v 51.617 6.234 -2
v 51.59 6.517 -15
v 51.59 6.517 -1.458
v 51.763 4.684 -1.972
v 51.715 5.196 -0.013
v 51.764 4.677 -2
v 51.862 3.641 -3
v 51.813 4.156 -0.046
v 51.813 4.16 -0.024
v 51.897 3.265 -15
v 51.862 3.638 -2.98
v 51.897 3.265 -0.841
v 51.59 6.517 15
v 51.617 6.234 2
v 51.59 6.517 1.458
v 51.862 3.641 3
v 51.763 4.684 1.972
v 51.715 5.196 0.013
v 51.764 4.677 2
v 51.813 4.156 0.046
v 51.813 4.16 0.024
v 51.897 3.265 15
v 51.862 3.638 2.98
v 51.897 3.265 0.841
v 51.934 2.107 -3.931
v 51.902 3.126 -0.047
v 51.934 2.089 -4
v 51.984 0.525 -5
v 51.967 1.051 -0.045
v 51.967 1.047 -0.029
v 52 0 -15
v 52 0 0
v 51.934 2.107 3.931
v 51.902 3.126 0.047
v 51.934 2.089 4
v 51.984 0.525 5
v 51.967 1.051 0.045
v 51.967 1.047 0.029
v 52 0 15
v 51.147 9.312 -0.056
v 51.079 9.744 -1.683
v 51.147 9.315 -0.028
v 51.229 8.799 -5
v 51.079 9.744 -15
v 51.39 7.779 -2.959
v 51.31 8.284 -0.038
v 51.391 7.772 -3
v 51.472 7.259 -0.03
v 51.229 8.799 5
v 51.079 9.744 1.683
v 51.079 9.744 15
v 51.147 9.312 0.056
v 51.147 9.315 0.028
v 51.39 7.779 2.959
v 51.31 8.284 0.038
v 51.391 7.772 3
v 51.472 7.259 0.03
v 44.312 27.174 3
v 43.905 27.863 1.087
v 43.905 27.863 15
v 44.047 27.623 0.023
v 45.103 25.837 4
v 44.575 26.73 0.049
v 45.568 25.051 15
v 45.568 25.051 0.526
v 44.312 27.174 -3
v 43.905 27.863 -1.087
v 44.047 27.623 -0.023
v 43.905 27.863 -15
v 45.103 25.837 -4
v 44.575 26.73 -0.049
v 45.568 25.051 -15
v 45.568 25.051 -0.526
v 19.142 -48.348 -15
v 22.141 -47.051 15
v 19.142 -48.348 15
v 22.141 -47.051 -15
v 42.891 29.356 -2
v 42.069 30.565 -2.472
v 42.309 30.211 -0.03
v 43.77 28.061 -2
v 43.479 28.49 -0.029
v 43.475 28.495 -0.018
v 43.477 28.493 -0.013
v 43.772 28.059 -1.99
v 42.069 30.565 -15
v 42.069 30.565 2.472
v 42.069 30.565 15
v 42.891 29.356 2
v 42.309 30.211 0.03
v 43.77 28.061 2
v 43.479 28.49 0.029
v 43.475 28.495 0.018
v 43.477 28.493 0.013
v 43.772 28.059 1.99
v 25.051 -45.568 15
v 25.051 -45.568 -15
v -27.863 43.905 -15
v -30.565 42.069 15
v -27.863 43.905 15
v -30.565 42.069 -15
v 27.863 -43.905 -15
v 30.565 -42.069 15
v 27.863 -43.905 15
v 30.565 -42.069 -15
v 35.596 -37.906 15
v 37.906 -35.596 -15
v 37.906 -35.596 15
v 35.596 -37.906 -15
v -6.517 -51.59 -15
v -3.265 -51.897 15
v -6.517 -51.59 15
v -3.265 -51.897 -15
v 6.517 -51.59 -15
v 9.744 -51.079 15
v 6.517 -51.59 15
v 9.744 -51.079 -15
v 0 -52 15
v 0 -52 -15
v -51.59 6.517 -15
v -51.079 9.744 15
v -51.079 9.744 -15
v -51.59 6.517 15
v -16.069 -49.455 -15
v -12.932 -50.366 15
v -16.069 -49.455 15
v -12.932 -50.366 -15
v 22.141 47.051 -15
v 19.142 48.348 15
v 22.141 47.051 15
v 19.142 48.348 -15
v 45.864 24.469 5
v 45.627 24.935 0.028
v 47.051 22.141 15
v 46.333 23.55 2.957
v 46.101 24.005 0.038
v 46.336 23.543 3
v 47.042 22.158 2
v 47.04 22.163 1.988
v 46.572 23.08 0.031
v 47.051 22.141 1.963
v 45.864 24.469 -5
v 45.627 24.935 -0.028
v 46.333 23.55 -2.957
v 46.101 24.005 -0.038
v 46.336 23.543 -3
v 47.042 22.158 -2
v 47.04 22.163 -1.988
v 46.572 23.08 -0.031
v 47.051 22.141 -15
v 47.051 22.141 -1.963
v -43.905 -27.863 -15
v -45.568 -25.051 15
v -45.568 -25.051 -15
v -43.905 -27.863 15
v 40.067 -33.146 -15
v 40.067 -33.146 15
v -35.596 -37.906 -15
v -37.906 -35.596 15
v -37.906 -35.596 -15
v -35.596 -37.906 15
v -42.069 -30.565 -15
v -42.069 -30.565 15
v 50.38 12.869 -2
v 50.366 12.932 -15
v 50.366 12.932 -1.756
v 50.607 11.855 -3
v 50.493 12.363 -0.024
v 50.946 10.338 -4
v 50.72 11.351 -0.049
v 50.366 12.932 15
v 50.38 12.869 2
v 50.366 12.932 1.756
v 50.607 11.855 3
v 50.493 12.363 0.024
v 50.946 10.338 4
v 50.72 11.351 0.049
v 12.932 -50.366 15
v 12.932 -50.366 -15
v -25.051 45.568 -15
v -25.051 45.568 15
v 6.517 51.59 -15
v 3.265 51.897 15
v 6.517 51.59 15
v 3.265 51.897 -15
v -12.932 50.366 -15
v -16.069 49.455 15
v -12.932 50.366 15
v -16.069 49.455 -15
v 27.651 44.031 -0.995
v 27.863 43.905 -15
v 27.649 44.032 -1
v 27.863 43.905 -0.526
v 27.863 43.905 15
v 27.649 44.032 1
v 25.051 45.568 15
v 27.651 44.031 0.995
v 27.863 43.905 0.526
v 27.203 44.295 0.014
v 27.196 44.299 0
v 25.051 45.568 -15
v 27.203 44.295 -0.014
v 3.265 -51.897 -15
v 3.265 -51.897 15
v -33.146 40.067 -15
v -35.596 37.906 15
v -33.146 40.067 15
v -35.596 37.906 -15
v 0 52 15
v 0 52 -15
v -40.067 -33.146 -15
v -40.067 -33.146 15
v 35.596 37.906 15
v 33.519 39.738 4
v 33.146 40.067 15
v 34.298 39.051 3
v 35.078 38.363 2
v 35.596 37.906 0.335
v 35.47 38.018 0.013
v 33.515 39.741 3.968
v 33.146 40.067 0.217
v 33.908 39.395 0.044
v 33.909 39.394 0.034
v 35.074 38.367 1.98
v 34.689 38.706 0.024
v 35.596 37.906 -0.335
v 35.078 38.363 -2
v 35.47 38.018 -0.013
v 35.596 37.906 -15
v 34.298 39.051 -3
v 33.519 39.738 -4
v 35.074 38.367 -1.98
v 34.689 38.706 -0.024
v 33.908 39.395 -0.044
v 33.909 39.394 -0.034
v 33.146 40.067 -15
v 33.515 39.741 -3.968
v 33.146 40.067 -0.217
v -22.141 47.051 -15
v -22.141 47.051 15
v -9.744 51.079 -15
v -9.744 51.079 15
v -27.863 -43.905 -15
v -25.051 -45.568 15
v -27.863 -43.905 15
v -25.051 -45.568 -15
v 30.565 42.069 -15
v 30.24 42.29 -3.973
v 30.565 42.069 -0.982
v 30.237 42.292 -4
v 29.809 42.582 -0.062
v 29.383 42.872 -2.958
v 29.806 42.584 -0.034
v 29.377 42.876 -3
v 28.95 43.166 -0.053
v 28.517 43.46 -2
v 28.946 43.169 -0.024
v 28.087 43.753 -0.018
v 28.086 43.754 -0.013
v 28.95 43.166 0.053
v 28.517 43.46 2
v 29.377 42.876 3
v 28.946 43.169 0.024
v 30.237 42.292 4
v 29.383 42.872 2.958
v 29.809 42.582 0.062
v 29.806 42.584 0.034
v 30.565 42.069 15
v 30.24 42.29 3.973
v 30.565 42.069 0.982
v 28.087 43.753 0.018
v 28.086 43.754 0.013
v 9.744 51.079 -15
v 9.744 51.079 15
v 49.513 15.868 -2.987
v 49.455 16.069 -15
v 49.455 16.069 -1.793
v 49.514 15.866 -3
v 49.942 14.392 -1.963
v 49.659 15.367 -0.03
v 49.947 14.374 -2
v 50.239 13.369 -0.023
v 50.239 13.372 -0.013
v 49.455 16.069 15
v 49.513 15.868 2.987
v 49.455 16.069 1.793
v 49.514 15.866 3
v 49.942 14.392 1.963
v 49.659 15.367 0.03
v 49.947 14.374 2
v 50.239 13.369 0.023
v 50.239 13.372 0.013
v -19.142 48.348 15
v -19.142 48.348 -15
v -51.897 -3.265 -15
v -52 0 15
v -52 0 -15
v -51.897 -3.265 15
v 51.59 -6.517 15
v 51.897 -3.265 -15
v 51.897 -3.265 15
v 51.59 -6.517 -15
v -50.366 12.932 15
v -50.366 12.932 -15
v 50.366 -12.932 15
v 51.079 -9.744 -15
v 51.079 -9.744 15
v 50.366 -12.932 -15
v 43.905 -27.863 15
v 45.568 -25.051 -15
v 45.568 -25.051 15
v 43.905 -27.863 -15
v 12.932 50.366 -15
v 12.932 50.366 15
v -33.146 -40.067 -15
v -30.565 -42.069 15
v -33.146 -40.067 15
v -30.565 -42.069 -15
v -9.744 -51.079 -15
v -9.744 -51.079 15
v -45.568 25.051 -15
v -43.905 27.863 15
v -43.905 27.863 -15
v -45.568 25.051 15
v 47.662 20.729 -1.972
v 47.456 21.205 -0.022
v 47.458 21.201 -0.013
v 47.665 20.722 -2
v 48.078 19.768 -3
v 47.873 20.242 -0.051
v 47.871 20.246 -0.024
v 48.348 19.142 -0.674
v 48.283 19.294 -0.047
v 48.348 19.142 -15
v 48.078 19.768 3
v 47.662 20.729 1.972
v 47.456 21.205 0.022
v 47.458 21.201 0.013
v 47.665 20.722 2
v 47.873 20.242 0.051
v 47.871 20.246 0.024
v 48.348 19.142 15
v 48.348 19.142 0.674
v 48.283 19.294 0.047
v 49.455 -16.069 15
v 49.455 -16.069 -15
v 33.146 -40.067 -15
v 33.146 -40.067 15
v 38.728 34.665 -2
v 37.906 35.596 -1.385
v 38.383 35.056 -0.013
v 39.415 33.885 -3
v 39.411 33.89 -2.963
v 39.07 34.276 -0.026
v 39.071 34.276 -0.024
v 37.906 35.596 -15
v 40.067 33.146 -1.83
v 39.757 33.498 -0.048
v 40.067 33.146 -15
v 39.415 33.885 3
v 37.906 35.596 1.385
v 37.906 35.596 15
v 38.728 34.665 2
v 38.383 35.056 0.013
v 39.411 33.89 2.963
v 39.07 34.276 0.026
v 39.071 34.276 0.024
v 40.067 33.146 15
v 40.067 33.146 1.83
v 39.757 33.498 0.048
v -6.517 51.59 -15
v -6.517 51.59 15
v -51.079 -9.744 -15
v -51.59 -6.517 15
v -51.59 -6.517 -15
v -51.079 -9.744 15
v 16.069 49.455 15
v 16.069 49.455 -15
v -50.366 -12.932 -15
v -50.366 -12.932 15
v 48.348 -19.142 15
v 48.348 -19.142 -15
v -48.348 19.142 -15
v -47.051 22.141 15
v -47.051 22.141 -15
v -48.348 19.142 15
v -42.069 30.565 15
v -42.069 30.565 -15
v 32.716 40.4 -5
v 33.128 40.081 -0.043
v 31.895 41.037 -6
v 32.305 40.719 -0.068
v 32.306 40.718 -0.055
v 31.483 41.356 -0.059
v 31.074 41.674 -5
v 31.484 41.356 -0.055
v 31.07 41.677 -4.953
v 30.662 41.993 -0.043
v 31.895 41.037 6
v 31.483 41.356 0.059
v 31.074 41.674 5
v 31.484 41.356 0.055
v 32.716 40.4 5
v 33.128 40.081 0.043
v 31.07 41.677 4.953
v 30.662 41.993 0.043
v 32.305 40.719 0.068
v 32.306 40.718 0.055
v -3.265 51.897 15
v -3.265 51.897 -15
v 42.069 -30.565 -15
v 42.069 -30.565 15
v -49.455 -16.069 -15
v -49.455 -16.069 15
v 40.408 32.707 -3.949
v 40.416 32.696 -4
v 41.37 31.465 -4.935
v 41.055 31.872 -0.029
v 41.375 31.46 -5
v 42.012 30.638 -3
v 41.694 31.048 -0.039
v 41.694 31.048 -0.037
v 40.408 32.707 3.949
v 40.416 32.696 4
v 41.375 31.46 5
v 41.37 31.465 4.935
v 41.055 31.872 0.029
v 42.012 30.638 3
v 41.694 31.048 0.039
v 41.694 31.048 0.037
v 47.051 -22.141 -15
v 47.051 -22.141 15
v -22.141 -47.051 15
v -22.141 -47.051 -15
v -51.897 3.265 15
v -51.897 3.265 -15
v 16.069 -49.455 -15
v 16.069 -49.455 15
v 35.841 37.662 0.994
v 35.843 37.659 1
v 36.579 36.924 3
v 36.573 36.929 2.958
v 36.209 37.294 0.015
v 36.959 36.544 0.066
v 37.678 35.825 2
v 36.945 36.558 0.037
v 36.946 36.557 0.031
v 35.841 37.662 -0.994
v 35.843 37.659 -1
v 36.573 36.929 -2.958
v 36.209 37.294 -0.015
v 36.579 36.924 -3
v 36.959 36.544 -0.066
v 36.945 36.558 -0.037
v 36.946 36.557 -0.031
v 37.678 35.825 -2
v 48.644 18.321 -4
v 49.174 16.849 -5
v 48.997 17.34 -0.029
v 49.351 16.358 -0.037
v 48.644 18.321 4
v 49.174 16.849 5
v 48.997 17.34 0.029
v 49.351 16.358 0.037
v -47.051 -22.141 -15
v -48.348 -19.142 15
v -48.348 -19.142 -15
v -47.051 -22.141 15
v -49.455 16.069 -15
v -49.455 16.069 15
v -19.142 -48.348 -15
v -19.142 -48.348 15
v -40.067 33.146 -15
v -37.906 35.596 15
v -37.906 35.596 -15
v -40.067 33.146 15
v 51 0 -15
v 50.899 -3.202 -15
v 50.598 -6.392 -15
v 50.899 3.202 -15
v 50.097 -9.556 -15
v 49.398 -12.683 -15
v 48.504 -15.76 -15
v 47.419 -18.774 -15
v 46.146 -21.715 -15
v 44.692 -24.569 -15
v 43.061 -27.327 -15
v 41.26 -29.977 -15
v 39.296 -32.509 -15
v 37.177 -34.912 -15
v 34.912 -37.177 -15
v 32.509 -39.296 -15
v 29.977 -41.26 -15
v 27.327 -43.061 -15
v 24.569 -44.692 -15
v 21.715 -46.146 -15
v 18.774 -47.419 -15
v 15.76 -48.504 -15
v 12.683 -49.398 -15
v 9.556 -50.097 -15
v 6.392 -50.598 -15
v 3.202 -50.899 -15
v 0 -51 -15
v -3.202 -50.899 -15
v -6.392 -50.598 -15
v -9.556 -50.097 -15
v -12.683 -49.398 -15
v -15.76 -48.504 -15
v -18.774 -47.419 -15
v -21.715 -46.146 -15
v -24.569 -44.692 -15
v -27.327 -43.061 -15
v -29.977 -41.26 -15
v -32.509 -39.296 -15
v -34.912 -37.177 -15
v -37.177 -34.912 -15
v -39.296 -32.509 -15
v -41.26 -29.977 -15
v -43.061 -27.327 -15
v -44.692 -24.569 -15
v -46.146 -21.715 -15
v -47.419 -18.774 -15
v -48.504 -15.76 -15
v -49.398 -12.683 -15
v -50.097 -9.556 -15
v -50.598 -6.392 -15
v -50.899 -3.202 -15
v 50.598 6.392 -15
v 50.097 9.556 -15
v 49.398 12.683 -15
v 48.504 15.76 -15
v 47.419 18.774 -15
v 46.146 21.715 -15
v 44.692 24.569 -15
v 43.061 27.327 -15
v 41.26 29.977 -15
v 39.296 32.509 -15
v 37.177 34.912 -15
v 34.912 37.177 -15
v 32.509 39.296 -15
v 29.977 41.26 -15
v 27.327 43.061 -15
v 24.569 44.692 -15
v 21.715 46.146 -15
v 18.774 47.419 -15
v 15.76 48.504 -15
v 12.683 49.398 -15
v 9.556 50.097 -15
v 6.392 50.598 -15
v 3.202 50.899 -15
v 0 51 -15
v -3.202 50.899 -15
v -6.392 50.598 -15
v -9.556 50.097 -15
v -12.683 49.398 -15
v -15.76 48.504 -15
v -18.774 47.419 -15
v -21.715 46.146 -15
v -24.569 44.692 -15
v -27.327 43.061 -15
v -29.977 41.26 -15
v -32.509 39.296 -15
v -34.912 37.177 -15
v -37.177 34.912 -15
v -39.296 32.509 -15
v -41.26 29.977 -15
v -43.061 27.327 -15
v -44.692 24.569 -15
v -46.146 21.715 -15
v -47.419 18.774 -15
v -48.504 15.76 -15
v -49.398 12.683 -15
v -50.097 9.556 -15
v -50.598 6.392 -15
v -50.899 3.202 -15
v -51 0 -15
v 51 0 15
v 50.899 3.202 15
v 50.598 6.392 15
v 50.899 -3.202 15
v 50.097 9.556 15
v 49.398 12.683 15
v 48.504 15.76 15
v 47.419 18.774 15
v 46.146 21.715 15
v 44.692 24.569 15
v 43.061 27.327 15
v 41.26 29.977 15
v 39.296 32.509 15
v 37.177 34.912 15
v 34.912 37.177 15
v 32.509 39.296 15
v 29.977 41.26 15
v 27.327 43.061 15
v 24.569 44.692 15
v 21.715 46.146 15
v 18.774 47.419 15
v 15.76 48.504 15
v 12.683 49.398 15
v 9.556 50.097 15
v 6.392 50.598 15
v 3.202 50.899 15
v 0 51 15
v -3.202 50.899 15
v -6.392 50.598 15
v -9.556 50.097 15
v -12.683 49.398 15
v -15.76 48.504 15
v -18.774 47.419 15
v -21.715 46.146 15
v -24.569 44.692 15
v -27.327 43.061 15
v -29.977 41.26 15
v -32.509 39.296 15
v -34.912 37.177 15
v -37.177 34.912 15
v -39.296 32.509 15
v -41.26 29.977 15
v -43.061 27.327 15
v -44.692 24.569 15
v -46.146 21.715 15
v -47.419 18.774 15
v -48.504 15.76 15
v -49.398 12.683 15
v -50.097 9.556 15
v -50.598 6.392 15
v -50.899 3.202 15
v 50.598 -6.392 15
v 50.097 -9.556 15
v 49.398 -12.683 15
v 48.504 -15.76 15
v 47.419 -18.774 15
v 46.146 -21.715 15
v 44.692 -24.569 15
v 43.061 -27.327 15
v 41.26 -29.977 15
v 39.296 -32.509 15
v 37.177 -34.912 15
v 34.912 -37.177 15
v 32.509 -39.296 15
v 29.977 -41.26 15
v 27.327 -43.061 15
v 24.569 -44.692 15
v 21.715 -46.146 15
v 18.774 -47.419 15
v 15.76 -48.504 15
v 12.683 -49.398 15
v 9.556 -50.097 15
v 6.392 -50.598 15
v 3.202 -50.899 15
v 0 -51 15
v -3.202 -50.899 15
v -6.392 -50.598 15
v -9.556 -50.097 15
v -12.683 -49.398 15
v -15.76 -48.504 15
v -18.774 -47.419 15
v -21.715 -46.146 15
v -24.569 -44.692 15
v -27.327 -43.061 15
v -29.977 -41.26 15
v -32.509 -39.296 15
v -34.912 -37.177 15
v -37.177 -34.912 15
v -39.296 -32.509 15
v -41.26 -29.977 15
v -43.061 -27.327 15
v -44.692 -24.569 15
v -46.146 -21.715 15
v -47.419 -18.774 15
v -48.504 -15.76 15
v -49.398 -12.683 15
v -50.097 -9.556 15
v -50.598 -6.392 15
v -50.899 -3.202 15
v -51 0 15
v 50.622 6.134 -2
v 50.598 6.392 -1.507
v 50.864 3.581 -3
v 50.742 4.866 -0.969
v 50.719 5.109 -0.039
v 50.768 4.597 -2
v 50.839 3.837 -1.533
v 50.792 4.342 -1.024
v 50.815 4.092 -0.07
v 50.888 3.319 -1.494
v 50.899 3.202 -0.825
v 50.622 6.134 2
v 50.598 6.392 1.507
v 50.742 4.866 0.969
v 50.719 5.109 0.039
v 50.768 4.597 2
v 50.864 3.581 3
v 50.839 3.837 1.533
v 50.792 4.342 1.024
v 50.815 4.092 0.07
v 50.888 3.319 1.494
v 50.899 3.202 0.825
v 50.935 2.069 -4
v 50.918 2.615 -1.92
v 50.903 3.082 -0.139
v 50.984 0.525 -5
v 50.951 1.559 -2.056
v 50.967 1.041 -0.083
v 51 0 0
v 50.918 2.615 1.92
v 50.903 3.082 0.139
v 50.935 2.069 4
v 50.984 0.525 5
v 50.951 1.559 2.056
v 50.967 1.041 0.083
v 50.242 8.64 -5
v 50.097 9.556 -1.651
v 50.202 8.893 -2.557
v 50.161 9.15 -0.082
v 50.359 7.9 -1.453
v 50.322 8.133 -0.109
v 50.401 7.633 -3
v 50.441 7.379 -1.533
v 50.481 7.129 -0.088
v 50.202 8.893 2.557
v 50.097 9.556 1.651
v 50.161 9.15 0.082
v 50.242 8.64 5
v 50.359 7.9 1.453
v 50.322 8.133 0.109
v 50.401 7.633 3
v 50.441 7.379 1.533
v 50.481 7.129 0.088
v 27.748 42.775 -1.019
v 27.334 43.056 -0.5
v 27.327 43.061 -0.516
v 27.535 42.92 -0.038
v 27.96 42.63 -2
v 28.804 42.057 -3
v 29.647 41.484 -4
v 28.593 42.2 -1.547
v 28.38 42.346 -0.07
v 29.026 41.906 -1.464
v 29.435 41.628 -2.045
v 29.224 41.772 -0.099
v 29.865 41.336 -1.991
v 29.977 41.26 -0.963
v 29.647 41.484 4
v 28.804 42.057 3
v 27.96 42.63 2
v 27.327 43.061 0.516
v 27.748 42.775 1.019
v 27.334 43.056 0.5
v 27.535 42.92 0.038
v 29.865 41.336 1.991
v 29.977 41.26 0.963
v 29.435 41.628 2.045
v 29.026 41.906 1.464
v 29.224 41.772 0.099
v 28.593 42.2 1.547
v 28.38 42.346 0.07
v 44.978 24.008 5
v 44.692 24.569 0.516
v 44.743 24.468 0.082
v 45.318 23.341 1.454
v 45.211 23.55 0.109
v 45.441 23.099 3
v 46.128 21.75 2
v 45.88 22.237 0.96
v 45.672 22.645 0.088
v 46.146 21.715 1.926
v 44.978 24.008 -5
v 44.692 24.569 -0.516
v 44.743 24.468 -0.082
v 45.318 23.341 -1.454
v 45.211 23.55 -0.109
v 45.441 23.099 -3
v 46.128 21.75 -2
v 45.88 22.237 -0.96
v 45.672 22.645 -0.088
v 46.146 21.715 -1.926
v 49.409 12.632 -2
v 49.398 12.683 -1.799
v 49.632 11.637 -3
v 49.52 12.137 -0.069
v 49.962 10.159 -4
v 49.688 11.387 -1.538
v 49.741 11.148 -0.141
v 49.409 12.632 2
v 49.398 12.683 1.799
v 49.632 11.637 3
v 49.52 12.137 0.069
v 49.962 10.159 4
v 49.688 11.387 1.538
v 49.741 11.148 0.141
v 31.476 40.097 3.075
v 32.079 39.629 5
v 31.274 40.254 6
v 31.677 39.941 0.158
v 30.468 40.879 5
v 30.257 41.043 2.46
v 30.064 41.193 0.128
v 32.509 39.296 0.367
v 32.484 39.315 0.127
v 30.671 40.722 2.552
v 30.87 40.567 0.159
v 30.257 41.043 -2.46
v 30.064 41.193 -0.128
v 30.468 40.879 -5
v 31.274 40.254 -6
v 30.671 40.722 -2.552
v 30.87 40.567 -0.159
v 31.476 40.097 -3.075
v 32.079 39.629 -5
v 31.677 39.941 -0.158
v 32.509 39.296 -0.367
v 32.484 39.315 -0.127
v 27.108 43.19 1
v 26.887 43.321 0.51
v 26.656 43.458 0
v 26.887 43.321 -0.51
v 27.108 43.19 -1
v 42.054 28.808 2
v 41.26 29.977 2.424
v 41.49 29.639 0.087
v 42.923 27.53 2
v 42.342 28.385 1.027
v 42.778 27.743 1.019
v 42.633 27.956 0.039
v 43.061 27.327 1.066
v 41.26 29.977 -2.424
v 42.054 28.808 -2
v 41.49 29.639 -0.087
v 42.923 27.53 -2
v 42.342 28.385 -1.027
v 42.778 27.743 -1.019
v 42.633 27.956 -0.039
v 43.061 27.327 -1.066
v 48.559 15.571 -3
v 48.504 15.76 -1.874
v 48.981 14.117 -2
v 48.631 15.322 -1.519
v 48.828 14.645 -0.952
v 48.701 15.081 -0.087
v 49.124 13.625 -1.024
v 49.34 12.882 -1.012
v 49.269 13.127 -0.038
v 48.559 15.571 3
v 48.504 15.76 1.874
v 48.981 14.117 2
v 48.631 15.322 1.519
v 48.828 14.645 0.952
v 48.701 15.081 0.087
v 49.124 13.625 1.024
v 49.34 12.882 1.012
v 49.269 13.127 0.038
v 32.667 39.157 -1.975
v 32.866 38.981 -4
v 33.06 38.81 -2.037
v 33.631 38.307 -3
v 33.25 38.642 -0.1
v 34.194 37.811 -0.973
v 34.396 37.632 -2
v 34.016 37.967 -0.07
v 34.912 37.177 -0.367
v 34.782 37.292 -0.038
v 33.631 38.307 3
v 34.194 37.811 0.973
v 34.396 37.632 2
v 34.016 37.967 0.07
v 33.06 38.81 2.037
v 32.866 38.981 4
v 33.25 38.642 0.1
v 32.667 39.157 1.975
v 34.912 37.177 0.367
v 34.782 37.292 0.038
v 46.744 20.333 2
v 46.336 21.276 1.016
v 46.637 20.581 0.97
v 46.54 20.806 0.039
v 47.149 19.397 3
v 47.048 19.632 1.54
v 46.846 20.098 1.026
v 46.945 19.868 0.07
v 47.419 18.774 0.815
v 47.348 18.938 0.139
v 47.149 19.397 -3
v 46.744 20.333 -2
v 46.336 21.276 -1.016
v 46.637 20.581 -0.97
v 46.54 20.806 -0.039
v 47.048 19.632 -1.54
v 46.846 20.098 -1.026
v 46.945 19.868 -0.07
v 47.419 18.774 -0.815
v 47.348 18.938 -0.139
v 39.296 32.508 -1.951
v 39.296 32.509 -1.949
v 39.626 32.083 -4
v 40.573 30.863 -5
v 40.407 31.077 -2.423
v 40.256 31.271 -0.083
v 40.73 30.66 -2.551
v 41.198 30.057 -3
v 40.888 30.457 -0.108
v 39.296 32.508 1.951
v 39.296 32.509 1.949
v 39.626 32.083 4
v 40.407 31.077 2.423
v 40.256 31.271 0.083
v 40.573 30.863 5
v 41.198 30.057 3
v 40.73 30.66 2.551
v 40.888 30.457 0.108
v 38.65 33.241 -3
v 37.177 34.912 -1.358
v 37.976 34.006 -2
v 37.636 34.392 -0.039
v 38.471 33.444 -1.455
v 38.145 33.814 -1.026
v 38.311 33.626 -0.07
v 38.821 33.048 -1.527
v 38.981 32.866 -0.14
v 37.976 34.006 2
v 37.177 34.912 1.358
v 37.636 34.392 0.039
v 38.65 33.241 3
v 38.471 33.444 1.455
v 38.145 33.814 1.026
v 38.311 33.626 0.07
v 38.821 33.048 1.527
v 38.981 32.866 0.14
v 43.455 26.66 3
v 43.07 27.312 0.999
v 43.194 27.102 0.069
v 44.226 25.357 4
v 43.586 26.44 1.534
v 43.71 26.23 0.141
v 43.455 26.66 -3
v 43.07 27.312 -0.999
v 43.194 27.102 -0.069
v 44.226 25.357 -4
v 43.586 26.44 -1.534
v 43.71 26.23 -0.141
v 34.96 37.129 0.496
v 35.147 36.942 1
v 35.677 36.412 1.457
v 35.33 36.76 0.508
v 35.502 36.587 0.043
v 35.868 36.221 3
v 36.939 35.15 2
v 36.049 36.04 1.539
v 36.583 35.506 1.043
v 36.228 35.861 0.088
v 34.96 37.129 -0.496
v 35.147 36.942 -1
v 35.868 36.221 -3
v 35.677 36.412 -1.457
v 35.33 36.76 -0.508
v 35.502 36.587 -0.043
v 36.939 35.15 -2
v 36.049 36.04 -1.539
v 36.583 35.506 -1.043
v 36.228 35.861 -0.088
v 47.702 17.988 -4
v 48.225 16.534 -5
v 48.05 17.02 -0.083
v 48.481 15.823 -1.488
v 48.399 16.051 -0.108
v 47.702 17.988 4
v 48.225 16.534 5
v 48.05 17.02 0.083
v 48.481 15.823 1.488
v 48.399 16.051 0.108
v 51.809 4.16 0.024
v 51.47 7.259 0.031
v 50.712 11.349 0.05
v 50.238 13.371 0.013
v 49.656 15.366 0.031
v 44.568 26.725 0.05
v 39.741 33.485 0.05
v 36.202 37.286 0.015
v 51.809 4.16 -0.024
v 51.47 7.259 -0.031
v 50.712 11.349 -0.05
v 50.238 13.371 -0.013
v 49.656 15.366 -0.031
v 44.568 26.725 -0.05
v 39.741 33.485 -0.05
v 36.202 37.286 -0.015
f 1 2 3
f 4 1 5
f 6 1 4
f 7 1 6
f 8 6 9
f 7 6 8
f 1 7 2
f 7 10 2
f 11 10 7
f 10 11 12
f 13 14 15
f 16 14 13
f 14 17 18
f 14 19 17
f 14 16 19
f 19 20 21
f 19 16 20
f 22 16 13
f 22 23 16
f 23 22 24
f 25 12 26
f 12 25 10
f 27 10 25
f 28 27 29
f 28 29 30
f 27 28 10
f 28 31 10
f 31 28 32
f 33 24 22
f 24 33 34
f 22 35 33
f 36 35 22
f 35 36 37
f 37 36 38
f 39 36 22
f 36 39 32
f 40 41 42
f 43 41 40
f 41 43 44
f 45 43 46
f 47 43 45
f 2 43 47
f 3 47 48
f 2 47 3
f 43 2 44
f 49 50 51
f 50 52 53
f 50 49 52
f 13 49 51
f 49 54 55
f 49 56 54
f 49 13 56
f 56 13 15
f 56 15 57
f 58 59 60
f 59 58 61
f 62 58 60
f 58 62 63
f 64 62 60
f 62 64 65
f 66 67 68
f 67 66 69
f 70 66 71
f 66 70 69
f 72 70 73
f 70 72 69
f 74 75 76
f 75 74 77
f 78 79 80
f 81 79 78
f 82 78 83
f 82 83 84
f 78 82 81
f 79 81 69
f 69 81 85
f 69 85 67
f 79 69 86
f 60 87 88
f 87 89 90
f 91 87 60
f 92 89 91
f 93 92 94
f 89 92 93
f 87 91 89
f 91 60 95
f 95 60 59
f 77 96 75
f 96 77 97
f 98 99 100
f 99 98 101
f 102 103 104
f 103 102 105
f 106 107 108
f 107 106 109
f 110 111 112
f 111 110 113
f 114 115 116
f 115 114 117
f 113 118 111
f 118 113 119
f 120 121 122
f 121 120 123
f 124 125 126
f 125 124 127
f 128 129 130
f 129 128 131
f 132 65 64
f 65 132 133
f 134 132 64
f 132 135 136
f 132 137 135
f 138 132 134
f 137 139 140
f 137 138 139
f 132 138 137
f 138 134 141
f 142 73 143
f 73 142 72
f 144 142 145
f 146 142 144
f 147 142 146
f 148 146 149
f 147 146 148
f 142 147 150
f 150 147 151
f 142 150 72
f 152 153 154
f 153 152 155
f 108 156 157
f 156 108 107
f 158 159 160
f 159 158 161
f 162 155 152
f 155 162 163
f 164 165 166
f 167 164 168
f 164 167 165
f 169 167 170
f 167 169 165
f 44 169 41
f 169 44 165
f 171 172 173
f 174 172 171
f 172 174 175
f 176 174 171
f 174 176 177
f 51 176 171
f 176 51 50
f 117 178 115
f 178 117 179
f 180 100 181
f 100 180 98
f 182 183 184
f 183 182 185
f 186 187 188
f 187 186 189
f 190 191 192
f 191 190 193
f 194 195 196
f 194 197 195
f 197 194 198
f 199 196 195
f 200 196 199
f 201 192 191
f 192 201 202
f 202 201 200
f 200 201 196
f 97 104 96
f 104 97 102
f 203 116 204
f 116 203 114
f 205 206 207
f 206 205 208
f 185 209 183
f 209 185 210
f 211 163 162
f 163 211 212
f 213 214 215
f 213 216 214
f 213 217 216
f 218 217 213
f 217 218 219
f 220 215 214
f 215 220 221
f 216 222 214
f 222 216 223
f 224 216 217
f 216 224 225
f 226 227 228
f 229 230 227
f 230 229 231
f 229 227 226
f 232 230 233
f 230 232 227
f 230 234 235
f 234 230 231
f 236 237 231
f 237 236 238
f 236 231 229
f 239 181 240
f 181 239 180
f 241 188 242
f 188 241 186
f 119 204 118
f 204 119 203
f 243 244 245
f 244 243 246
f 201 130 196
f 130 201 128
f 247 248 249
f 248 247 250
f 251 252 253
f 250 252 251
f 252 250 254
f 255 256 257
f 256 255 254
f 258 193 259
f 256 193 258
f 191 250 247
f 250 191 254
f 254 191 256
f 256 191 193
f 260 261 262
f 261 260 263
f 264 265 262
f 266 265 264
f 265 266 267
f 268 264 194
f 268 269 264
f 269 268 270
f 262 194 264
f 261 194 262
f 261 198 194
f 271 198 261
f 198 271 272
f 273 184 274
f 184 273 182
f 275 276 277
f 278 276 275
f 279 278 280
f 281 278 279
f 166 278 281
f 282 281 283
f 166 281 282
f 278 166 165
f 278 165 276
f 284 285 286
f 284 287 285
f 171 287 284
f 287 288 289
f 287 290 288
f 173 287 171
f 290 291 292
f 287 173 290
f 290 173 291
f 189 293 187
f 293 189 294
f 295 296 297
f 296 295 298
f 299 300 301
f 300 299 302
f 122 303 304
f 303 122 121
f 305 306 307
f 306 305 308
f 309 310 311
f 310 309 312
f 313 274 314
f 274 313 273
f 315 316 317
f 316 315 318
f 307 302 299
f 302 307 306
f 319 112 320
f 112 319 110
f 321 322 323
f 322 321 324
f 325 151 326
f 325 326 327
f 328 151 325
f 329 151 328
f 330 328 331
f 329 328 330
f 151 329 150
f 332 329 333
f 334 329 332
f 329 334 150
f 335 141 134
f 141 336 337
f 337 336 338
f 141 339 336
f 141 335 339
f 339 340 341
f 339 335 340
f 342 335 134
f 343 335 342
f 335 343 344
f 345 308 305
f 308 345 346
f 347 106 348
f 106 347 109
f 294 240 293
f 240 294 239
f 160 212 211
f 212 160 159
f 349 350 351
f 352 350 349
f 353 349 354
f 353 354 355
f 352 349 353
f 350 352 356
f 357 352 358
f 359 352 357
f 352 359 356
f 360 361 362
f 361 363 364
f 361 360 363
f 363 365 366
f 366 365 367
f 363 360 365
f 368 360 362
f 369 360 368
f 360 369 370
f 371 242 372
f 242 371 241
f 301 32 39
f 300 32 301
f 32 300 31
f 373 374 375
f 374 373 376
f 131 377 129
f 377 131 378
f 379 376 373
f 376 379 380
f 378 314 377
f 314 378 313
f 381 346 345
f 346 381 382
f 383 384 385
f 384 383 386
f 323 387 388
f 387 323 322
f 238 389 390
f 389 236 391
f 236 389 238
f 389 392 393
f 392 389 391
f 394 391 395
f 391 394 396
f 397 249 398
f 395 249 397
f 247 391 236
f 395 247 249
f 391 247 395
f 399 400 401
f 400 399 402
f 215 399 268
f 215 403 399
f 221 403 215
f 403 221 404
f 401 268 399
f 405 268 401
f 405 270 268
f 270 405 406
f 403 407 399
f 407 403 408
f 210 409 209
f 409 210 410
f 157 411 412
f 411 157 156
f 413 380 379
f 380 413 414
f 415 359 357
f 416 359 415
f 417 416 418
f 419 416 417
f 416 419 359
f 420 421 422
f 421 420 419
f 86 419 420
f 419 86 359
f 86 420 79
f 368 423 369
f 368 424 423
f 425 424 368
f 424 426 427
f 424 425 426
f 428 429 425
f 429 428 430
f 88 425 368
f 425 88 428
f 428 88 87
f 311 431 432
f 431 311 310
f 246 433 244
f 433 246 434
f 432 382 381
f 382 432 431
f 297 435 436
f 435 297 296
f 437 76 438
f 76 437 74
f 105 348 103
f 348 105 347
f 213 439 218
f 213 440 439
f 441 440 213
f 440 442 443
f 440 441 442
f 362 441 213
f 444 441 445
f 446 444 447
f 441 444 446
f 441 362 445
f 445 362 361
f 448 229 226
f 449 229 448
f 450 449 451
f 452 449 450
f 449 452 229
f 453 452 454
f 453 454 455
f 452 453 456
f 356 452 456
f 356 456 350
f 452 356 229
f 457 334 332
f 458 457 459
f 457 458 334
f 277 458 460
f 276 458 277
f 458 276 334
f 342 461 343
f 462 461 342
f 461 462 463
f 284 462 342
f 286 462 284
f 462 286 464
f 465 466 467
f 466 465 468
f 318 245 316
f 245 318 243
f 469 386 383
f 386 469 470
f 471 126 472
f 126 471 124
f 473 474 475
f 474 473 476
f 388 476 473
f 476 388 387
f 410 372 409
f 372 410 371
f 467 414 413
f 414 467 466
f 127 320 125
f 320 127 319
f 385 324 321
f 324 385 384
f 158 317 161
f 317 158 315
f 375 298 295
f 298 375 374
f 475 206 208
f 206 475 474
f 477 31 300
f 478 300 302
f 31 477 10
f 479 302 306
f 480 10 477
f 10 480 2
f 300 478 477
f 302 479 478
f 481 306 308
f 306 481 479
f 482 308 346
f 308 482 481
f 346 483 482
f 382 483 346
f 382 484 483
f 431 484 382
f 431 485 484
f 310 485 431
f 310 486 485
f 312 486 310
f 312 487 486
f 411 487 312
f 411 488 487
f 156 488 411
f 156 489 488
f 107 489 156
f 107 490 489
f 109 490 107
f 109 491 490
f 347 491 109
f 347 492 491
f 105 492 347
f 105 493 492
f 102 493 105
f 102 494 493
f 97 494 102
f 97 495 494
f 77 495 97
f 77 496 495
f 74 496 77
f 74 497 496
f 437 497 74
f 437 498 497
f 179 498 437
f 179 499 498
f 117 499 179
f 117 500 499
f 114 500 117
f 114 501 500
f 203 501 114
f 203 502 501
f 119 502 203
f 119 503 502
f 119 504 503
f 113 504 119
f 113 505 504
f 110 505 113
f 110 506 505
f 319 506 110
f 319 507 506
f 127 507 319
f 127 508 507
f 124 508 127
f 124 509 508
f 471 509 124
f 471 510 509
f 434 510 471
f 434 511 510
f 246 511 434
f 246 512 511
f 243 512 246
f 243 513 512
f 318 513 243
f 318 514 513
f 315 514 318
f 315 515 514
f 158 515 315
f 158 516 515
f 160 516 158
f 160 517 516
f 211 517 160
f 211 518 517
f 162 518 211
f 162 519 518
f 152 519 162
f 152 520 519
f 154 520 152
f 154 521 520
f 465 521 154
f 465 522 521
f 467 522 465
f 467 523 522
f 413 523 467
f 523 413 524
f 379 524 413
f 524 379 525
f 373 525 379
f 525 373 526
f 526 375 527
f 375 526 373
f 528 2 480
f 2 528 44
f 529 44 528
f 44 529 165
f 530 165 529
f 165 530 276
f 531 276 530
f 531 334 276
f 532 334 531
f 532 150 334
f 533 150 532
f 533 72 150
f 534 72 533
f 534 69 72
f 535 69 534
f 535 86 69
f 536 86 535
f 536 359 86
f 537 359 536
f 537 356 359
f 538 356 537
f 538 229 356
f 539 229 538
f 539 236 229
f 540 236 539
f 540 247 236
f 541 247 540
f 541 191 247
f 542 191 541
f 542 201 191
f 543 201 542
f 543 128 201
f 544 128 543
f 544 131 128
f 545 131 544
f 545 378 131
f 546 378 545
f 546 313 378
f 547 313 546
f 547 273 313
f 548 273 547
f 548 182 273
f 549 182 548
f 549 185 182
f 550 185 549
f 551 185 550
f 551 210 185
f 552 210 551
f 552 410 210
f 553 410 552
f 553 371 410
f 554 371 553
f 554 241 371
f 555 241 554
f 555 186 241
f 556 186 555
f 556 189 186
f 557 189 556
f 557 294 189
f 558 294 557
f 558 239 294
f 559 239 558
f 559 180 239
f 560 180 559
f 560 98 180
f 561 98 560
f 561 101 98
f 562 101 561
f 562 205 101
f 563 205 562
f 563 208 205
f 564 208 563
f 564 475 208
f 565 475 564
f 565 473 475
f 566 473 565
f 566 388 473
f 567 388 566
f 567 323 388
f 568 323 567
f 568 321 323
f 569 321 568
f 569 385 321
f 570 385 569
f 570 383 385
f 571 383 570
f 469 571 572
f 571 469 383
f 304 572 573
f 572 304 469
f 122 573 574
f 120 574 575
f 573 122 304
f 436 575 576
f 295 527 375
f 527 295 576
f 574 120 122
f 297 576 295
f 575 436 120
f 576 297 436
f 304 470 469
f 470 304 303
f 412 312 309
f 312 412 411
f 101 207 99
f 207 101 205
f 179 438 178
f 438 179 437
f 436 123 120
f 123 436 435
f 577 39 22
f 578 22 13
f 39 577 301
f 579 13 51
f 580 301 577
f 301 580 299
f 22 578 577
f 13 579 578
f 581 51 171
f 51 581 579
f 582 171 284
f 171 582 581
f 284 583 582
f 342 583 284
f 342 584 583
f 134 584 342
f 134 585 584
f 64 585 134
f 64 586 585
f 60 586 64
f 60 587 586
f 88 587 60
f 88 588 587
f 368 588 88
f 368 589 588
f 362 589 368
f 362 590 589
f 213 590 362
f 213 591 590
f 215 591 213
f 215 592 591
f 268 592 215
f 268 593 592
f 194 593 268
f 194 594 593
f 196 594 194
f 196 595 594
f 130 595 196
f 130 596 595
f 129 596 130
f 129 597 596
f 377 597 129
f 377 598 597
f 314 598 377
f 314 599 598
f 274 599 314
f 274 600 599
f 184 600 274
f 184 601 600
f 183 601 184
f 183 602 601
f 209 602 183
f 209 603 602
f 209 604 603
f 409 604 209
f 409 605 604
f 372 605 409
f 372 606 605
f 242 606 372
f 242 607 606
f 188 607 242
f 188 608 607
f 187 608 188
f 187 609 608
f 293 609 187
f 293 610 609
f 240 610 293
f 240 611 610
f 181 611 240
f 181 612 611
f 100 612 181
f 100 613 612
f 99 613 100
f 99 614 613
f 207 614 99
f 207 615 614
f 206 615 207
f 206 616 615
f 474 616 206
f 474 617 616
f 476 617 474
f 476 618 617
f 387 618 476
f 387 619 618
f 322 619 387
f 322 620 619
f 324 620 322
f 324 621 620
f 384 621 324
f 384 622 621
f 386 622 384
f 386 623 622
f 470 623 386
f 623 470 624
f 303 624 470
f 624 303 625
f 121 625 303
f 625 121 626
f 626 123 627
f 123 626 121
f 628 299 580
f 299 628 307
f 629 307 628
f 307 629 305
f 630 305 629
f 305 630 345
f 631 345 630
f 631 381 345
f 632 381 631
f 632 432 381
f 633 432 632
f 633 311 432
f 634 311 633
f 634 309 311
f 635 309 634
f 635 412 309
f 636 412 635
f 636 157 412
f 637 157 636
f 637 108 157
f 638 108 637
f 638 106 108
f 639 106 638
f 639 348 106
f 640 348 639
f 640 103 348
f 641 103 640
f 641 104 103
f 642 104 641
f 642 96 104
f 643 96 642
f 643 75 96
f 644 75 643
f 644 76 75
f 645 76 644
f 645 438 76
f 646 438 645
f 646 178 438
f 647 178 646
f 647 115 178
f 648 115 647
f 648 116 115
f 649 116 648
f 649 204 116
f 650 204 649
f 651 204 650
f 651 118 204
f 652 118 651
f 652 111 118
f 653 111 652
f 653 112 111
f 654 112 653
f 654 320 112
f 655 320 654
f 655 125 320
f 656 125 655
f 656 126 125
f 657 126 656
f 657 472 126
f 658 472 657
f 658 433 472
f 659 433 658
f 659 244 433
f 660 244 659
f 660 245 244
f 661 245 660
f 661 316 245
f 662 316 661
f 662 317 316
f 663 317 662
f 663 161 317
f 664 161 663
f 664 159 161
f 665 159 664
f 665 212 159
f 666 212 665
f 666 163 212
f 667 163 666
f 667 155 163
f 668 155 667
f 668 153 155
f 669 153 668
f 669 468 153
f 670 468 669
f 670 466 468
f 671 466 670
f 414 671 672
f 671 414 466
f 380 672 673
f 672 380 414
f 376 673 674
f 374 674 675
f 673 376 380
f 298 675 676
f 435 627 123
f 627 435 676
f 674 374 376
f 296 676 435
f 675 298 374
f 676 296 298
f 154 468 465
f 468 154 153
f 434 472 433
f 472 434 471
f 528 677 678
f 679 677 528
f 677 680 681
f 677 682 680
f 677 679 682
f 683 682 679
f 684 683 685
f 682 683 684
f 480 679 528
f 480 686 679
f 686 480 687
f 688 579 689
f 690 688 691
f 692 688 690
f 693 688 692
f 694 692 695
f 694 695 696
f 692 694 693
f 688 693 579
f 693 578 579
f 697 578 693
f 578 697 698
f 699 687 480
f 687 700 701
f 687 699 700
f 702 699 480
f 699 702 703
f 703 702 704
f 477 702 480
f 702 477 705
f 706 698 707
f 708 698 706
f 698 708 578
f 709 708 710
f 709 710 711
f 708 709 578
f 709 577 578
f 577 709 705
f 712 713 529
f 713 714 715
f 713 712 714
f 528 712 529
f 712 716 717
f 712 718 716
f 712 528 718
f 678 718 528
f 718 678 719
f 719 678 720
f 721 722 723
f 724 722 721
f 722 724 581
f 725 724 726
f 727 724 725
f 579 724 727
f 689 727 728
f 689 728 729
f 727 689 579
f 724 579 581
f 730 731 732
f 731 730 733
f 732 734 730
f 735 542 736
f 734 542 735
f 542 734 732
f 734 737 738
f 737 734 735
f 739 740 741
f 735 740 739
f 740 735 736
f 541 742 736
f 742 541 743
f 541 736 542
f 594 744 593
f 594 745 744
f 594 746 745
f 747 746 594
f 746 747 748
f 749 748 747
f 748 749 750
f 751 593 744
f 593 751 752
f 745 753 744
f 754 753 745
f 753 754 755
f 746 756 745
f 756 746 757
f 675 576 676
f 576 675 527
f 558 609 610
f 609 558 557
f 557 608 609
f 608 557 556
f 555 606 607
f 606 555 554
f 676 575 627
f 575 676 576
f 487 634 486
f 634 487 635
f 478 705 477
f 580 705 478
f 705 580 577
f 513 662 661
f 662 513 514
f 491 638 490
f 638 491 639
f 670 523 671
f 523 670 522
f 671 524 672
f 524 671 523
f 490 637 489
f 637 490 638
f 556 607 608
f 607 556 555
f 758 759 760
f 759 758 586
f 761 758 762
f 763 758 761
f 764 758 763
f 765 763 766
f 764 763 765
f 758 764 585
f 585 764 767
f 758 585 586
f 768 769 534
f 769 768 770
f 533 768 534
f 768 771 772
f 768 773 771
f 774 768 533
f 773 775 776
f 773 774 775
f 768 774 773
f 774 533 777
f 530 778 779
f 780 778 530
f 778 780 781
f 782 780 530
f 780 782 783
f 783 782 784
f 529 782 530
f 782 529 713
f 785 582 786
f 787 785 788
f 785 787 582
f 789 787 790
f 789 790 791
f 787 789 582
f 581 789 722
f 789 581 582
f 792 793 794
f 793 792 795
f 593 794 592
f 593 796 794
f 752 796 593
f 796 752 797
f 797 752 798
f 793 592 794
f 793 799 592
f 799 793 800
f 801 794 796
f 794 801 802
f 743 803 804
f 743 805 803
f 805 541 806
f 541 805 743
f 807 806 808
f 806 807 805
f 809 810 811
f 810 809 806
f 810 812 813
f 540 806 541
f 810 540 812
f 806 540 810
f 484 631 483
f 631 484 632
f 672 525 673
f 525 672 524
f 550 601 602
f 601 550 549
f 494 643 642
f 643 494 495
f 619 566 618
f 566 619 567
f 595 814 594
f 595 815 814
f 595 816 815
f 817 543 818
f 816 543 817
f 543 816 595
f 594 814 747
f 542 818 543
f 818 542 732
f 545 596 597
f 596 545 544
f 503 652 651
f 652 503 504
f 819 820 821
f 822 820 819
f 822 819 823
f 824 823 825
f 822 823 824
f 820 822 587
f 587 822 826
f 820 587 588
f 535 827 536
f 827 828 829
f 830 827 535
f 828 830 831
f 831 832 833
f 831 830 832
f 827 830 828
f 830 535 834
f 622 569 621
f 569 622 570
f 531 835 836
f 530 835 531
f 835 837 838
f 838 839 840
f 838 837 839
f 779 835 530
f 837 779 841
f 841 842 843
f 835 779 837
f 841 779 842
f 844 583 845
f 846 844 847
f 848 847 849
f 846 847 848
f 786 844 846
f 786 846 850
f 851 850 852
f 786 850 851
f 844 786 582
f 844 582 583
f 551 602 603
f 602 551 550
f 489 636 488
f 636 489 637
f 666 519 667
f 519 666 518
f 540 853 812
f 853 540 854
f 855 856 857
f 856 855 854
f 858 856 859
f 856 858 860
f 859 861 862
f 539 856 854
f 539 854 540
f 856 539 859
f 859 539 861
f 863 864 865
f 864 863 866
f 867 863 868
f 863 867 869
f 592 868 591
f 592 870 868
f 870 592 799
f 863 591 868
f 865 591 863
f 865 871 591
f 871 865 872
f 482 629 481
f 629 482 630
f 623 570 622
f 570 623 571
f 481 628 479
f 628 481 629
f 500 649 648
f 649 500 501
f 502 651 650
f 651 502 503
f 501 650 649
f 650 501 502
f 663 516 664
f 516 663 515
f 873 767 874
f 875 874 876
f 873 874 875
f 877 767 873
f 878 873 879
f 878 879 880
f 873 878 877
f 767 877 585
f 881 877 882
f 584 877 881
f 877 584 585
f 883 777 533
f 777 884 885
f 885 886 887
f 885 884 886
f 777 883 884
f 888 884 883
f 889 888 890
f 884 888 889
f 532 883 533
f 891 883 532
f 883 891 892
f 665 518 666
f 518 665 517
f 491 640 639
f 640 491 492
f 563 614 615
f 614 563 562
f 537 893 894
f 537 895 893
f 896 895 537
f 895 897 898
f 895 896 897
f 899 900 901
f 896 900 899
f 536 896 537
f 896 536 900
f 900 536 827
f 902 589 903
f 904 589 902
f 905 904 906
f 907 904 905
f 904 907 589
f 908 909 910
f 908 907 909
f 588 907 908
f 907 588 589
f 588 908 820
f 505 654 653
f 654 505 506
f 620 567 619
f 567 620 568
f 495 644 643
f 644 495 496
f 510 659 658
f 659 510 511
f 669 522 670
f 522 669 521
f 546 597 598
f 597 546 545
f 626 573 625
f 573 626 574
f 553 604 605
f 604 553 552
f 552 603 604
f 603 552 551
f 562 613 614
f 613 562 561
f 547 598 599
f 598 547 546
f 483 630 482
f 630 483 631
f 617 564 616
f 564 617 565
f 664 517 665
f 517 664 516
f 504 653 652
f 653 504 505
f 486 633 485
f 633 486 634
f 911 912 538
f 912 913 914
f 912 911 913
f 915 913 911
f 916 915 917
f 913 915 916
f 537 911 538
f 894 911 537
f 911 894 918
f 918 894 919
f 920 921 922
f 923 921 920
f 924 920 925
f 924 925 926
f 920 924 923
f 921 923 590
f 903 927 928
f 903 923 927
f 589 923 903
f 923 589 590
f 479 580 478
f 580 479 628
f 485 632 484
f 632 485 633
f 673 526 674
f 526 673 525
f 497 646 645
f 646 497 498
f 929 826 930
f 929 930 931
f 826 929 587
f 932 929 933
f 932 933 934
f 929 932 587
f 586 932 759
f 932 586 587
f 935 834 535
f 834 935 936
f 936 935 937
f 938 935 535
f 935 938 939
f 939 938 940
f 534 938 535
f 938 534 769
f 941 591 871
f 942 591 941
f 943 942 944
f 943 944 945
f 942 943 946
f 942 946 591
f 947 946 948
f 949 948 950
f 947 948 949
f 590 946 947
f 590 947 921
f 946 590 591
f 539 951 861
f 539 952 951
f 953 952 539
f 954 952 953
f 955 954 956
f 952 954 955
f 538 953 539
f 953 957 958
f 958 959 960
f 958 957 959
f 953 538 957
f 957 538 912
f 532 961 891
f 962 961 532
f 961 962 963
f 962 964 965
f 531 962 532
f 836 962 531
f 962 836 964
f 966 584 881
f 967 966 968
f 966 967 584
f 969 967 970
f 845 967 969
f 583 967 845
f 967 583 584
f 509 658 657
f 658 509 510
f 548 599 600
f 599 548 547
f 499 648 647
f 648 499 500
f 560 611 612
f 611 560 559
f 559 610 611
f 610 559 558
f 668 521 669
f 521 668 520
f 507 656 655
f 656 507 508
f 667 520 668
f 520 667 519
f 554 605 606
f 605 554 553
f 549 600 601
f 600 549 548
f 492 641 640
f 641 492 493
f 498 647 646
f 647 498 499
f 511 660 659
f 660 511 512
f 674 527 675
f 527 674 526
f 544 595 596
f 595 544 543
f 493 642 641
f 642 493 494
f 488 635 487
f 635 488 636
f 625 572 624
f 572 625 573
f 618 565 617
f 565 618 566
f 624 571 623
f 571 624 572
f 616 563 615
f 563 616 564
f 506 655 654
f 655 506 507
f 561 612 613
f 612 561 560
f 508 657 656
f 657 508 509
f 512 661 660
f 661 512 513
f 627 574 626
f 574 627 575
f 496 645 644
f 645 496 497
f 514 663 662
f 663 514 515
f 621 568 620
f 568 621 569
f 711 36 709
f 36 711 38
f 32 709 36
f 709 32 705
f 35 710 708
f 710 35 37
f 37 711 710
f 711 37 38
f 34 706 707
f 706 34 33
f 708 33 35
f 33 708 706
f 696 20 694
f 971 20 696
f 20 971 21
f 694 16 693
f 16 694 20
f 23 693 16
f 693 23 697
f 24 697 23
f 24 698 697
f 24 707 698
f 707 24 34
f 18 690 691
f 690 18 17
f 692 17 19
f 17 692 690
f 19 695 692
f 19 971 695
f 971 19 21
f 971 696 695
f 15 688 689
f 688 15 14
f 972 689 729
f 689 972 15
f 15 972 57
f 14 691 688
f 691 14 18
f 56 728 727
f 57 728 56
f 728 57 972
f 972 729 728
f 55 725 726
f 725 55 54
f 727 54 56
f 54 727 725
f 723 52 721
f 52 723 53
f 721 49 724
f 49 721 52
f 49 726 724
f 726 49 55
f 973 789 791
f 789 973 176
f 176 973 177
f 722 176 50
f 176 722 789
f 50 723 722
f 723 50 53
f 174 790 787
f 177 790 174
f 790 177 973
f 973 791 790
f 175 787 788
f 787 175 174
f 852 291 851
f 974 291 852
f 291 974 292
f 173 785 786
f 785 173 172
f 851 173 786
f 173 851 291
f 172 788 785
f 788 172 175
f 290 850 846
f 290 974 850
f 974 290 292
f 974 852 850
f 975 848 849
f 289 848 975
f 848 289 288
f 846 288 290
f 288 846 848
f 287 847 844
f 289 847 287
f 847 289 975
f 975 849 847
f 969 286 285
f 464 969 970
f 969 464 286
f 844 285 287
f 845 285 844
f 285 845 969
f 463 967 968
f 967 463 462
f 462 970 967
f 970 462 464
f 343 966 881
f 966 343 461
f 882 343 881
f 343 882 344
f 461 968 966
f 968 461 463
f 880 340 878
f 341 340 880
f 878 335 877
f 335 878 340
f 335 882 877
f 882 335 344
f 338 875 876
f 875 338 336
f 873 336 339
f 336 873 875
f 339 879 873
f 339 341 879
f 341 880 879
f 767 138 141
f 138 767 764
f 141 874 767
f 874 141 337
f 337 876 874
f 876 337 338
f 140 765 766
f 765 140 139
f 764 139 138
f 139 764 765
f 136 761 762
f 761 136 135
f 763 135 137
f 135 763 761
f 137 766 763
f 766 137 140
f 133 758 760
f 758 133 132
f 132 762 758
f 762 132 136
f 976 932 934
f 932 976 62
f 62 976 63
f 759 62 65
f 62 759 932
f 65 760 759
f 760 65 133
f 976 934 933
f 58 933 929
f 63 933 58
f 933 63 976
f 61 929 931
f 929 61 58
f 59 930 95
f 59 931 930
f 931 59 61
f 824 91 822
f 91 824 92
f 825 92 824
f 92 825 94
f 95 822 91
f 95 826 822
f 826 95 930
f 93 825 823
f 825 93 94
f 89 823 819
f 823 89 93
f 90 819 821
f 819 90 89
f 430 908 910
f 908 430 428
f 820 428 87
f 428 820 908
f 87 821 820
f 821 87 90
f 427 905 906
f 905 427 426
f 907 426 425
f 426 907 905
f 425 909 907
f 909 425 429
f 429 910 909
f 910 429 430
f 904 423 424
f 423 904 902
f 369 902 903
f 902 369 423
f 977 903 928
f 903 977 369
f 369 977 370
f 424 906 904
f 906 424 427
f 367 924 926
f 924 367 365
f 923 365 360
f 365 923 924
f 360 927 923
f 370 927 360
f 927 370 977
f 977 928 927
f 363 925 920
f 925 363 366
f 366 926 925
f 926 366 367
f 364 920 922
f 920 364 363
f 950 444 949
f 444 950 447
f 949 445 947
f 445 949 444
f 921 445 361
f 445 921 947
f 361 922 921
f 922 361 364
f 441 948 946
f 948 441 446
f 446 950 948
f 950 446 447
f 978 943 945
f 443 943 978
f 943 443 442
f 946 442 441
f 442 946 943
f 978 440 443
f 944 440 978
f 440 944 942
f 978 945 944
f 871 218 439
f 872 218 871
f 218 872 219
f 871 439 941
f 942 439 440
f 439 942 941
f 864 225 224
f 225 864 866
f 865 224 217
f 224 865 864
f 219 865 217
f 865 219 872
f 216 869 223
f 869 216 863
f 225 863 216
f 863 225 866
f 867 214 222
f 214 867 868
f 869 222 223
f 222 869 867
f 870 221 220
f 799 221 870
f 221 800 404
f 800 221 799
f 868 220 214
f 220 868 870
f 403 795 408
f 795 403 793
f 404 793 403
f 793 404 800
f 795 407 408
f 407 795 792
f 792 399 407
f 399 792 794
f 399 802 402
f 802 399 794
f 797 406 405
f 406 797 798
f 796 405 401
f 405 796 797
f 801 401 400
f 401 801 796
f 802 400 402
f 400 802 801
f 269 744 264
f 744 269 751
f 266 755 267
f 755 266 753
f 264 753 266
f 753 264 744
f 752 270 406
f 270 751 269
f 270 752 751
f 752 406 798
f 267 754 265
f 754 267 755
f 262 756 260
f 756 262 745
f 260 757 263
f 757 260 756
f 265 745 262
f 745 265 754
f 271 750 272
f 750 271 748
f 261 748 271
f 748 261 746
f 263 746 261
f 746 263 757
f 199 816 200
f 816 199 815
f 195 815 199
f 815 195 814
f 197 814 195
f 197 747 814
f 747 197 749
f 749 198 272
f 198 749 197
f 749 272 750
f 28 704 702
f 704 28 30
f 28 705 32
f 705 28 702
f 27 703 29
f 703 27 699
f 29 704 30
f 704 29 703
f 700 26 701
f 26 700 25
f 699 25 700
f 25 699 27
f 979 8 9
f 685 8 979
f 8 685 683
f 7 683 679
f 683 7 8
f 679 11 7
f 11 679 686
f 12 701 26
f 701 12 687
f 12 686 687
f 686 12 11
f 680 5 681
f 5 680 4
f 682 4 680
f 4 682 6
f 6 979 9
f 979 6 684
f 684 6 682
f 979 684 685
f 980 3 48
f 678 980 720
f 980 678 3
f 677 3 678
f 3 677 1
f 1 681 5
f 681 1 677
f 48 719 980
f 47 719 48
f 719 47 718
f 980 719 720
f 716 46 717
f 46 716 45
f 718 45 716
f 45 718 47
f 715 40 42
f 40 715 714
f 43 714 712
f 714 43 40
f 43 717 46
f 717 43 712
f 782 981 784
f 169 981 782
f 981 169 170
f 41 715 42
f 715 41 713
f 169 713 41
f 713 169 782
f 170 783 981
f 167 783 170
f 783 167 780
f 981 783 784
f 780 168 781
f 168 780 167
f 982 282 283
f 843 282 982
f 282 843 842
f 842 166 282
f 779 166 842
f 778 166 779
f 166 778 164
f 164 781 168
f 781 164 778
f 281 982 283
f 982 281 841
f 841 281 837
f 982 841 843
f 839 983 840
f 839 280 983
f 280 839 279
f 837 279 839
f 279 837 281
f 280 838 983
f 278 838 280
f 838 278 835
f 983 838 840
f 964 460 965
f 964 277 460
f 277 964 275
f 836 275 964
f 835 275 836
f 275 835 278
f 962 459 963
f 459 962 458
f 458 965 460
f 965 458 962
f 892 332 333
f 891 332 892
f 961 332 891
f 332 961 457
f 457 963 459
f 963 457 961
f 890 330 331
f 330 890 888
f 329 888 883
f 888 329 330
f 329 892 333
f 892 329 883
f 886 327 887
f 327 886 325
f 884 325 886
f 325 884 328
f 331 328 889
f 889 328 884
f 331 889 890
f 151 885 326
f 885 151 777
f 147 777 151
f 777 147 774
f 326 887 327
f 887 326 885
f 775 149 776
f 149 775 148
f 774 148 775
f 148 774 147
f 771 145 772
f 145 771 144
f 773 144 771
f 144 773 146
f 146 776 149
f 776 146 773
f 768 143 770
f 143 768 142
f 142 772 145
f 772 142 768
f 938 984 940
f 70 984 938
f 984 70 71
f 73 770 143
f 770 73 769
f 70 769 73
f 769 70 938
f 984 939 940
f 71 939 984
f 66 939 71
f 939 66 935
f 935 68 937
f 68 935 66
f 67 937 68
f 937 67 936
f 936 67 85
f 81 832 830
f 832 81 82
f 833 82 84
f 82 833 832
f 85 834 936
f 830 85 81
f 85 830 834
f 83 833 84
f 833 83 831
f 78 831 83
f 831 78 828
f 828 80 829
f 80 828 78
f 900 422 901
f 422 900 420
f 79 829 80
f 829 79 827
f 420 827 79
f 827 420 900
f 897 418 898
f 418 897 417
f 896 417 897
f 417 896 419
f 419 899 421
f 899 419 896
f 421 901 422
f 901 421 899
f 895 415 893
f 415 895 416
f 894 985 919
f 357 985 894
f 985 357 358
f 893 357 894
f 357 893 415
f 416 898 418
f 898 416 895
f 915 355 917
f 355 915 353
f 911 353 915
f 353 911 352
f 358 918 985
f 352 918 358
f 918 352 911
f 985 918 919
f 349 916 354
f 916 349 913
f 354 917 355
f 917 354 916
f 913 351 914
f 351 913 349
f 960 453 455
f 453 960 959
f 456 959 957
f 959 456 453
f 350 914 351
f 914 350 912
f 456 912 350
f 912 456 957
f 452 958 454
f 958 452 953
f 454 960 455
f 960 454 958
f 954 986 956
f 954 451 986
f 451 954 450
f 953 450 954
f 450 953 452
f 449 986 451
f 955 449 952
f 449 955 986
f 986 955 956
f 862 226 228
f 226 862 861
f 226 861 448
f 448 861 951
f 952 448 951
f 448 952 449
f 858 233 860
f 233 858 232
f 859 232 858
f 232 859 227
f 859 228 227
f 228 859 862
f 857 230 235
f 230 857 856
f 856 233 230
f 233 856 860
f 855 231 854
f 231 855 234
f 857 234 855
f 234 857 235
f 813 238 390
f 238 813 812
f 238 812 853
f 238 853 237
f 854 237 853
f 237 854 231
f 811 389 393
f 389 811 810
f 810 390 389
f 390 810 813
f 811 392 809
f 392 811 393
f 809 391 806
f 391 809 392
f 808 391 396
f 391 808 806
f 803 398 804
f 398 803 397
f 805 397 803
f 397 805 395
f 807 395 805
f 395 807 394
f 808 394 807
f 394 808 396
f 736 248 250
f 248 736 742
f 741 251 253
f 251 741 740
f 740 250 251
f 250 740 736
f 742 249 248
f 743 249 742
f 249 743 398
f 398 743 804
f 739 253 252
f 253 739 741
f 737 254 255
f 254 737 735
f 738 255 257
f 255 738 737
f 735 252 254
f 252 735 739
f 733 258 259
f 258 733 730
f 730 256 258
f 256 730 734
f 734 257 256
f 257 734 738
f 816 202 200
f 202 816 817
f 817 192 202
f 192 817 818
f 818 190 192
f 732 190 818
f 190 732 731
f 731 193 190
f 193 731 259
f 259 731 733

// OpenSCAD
$fn=100;
angle = 180;
wavePeaks = [5,4,3,2,2,3,5,4,3,2,2,3,5,4,3,2,2,3,5,4,3,2,2,3,5,4,3,2,2,3,1,2,3,4,5,6,5,4,3,2,1];
waveDistances = [1,2,1,1,2,1,1,2,1,1,2,1,1,2,1,1,2,1,1,2,1,1,2,1,1,2,1,1,2,1,1,1,1,1,1,1,1,1,1,1,1];
r = 50;
circ = r*2*pi();

length = sum(waveDistances,len(waveDistances)-1,0);

function pi()=3.14159265358979323846;
function sum(v,i,s=0) = (i==s ? v[i] : v[i] + sum(v,i-1,s));
function trans(i) = [cos(i)*r,sin(i)*r];
function angle(i) = 360/circ*i;

module wave() {
    //for(i=[0,1])mirror([0,i,0])
    for(i=[0:len(waveDistances)]) {
        distance = waveDistances[i];
        translate([sum(waveDistances,i,0)-waveDistances[i],0])
            polygon(points=[[0,0],[distance,0],[1/2*distance,wavePeaks[i]]]);
    }
}

module waveExtrusion() {
    for(i=[0,1])mirror([0,0,i])for(i=[0:len(waveDistances)-1]) {
        distance = waveDistances[i]*1.05;
        a = angle(sum(waveDistances,i,0)-waveDistances[i]);
        translate(trans(a))rotate(a=[0,0,a])rotate(a=[90,0,90])
                linear_extrude(height=2)polygon(points=[[0,0],[distance,0],[1/2*distance,wavePeaks[i]]]);
                    
    }
}    
module ring() {
    difference() {
        cylinder(r=52,h=30,center=true);
        cylinder(r=51,h=30,center=true);
    }
}
difference() {
    ring();
    waveExtrusion();
}
